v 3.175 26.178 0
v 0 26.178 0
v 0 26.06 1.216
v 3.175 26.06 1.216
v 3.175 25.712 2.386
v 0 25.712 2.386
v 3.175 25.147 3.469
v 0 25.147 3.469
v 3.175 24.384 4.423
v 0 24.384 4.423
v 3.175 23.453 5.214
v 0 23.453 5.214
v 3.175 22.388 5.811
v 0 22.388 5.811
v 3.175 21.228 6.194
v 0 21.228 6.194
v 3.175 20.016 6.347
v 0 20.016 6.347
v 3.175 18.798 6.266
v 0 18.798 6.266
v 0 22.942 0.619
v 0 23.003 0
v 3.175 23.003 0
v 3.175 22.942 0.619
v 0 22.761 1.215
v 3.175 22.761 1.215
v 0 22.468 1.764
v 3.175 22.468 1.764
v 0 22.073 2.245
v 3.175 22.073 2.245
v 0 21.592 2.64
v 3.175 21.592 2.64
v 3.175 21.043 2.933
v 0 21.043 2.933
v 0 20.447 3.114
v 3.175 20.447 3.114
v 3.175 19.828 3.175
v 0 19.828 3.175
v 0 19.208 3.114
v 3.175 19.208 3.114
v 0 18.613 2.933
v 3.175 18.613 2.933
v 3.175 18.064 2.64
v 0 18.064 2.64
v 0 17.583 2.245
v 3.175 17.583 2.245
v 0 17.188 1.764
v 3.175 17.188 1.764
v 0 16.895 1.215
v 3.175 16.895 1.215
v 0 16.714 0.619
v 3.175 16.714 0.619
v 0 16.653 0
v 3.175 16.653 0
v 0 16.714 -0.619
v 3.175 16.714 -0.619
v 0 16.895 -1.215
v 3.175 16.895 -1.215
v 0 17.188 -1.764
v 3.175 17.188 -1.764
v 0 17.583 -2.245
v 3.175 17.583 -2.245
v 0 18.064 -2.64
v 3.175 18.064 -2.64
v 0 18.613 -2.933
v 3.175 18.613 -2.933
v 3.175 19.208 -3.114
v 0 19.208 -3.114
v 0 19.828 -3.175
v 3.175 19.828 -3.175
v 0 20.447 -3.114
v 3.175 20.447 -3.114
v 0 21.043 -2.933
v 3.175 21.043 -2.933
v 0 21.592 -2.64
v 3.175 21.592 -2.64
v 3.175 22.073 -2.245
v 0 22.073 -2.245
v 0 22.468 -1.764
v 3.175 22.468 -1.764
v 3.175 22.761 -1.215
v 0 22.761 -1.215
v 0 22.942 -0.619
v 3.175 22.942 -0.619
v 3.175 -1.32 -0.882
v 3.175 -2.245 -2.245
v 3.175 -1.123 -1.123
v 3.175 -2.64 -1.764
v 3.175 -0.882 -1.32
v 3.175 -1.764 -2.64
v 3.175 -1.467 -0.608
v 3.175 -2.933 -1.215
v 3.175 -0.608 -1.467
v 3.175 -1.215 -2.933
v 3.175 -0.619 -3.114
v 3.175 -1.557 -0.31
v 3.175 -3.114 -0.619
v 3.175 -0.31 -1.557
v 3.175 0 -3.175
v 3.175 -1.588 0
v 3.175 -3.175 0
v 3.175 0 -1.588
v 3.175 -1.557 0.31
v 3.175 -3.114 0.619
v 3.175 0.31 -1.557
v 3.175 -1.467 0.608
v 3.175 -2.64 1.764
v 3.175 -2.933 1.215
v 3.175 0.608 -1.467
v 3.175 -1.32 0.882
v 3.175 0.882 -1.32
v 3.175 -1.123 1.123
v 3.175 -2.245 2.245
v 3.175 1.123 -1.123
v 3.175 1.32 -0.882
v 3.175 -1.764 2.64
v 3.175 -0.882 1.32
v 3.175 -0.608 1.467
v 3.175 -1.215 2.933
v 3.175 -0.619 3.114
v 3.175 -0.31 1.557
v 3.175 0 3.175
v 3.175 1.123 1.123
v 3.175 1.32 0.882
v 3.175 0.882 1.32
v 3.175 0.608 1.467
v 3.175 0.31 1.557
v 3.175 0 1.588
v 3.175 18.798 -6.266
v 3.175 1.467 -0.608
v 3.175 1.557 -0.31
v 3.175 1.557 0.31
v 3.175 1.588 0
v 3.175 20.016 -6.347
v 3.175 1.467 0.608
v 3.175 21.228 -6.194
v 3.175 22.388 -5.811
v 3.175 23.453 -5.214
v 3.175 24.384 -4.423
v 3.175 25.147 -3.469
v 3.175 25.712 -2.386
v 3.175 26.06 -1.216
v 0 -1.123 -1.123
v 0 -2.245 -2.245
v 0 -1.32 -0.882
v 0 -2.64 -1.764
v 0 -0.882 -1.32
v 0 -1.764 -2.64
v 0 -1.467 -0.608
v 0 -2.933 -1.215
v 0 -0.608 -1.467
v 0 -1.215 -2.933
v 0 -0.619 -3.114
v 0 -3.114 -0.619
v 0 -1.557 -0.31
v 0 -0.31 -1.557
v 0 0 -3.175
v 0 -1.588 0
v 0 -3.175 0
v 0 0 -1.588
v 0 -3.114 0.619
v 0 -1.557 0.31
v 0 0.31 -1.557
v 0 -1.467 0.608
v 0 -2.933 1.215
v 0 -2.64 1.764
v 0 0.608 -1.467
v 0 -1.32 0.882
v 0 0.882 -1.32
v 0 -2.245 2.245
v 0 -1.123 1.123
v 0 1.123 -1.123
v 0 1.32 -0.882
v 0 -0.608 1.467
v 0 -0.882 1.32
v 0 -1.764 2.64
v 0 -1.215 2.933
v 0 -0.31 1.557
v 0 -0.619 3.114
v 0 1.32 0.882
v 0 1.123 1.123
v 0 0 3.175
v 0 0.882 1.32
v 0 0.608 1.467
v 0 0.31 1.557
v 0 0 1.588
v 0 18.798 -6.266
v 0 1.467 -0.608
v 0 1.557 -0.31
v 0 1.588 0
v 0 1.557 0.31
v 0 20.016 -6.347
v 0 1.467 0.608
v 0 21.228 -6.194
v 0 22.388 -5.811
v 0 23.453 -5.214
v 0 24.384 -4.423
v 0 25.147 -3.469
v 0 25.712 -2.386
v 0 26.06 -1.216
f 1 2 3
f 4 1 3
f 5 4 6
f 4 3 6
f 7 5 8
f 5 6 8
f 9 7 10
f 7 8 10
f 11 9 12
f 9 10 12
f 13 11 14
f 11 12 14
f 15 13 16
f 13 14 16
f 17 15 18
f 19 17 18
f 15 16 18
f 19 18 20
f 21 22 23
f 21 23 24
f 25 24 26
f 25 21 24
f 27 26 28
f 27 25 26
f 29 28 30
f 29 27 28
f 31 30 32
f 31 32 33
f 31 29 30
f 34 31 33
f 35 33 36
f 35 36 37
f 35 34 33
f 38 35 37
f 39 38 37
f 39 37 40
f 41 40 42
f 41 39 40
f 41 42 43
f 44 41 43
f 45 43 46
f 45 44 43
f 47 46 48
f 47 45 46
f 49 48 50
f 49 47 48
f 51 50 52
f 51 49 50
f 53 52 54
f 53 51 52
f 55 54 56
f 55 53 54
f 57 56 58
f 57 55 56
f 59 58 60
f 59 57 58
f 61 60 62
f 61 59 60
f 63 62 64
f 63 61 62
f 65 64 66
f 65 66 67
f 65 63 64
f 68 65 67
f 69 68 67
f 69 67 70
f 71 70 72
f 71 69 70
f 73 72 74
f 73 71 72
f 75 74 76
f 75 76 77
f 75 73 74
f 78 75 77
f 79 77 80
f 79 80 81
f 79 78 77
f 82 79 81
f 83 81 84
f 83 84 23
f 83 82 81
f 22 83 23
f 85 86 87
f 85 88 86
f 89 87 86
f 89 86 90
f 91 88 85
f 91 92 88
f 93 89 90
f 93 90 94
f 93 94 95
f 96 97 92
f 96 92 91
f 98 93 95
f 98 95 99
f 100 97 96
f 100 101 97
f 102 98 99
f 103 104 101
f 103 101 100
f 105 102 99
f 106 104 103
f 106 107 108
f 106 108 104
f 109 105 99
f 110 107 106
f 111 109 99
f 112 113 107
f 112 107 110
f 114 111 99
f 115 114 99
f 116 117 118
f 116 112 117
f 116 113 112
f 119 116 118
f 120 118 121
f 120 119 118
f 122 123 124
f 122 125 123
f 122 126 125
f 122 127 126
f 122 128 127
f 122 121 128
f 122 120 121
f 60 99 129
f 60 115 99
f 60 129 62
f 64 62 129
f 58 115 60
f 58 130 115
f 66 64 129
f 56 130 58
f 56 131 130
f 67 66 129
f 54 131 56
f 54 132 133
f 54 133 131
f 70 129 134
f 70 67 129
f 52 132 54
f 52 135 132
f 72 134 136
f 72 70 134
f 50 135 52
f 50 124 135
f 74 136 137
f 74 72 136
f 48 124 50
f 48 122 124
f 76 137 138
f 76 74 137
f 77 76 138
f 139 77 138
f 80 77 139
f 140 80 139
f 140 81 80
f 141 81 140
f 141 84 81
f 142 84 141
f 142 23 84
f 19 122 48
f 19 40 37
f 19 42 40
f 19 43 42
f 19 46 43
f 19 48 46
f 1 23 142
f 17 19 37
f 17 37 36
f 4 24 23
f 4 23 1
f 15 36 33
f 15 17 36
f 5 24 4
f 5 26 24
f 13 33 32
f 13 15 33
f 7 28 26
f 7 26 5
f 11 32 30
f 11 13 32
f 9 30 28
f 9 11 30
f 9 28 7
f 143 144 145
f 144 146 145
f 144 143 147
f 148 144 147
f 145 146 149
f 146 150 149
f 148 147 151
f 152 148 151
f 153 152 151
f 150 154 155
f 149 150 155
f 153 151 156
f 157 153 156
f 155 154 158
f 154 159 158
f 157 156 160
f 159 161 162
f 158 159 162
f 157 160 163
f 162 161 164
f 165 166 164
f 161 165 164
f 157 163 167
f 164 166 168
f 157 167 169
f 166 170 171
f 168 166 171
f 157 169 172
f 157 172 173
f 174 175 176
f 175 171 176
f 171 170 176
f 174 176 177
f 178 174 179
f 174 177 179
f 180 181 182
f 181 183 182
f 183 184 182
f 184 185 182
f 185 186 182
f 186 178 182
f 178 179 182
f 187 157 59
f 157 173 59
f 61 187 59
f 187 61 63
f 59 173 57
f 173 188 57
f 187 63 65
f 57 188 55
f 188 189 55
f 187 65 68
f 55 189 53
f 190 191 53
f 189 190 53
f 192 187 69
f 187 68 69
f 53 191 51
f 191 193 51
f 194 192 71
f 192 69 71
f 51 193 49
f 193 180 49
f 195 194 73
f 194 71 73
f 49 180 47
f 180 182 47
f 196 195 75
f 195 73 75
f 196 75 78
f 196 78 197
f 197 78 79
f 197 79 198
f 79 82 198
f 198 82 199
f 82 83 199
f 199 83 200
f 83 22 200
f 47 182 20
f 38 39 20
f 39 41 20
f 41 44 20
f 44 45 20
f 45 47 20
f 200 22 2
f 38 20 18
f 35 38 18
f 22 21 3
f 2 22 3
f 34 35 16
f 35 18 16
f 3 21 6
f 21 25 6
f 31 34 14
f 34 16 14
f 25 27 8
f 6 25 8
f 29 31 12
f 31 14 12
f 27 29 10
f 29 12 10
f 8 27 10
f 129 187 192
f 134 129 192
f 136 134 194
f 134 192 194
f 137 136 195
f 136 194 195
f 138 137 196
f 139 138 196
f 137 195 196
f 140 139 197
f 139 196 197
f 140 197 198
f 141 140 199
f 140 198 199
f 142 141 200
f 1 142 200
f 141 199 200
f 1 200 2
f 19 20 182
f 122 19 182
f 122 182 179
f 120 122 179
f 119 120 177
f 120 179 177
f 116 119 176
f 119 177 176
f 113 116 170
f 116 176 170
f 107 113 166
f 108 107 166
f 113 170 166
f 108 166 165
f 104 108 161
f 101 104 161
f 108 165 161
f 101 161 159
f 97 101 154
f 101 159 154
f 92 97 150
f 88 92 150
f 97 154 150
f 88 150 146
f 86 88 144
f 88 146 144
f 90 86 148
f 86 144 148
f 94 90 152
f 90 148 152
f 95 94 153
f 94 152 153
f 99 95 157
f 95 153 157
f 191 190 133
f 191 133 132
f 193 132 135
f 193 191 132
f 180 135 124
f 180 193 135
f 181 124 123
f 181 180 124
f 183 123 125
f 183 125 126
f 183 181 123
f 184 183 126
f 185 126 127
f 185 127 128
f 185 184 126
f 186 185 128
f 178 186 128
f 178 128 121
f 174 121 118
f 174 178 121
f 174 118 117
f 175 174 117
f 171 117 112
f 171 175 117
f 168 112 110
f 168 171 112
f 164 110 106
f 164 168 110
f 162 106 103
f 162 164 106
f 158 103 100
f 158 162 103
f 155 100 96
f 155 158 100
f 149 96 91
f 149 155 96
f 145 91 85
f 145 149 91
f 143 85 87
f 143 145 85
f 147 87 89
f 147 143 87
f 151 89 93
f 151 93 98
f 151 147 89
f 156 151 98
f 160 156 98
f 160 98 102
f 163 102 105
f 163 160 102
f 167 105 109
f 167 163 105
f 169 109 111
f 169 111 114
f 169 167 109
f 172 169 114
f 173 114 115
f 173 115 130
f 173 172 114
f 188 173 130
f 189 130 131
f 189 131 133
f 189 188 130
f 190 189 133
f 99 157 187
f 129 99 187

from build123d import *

# Parameters (mm, degrees)
F0_R     = 1.5875
F0_R_2   = 3.175
F1_DEPTH = 3.175


with BuildPart() as f1:
    # F0 (on Right) → F1 (new body)
    with BuildSketch(Plane.YZ):
        with BuildLine():
            ThreePointArc((0, 3.175), (2.245064, 2.245064), (3.175, 0))
            ThreePointArc((3.175, 0), (2.245064, -2.245064), (0, -3.175))
            Line((0, -3.175), (18.797582, -6.265861))
            ThreePointArc((18.797582, -6.265861), (13.477869, 0), (18.797582, 6.265861))
            Line((18.797582, 6.265861), (0, 3.175))
        make_face()
        with BuildLine():
            ThreePointArc((0, -3.175), (2.245064, -2.245064), (3.175, 0))
            ThreePointArc((3.175, 0), (2.245064, 2.245064), (0, 3.175))
            ThreePointArc((0, 3.175), (-3.175, 0), (0, -3.175))
        make_face()
        Circle(F0_R, mode=Mode.SUBTRACT)
        with BuildLine():
            ThreePointArc((26.177869, 0), (23.937624, 4.840704), (18.797582, 6.265861))
            ThreePointArc((18.797582, 6.265861), (13.477869, 0), (18.797582, -6.265861))
            ThreePointArc((18.797582, -6.265861), (23.937624, -4.840704), (26.177869, 0))
        make_face()
        with Locations((19.827869, 0)):
            Circle(F0_R_2, mode=Mode.SUBTRACT)
    extrude(amount=F1_DEPTH)


solid = f1.part
